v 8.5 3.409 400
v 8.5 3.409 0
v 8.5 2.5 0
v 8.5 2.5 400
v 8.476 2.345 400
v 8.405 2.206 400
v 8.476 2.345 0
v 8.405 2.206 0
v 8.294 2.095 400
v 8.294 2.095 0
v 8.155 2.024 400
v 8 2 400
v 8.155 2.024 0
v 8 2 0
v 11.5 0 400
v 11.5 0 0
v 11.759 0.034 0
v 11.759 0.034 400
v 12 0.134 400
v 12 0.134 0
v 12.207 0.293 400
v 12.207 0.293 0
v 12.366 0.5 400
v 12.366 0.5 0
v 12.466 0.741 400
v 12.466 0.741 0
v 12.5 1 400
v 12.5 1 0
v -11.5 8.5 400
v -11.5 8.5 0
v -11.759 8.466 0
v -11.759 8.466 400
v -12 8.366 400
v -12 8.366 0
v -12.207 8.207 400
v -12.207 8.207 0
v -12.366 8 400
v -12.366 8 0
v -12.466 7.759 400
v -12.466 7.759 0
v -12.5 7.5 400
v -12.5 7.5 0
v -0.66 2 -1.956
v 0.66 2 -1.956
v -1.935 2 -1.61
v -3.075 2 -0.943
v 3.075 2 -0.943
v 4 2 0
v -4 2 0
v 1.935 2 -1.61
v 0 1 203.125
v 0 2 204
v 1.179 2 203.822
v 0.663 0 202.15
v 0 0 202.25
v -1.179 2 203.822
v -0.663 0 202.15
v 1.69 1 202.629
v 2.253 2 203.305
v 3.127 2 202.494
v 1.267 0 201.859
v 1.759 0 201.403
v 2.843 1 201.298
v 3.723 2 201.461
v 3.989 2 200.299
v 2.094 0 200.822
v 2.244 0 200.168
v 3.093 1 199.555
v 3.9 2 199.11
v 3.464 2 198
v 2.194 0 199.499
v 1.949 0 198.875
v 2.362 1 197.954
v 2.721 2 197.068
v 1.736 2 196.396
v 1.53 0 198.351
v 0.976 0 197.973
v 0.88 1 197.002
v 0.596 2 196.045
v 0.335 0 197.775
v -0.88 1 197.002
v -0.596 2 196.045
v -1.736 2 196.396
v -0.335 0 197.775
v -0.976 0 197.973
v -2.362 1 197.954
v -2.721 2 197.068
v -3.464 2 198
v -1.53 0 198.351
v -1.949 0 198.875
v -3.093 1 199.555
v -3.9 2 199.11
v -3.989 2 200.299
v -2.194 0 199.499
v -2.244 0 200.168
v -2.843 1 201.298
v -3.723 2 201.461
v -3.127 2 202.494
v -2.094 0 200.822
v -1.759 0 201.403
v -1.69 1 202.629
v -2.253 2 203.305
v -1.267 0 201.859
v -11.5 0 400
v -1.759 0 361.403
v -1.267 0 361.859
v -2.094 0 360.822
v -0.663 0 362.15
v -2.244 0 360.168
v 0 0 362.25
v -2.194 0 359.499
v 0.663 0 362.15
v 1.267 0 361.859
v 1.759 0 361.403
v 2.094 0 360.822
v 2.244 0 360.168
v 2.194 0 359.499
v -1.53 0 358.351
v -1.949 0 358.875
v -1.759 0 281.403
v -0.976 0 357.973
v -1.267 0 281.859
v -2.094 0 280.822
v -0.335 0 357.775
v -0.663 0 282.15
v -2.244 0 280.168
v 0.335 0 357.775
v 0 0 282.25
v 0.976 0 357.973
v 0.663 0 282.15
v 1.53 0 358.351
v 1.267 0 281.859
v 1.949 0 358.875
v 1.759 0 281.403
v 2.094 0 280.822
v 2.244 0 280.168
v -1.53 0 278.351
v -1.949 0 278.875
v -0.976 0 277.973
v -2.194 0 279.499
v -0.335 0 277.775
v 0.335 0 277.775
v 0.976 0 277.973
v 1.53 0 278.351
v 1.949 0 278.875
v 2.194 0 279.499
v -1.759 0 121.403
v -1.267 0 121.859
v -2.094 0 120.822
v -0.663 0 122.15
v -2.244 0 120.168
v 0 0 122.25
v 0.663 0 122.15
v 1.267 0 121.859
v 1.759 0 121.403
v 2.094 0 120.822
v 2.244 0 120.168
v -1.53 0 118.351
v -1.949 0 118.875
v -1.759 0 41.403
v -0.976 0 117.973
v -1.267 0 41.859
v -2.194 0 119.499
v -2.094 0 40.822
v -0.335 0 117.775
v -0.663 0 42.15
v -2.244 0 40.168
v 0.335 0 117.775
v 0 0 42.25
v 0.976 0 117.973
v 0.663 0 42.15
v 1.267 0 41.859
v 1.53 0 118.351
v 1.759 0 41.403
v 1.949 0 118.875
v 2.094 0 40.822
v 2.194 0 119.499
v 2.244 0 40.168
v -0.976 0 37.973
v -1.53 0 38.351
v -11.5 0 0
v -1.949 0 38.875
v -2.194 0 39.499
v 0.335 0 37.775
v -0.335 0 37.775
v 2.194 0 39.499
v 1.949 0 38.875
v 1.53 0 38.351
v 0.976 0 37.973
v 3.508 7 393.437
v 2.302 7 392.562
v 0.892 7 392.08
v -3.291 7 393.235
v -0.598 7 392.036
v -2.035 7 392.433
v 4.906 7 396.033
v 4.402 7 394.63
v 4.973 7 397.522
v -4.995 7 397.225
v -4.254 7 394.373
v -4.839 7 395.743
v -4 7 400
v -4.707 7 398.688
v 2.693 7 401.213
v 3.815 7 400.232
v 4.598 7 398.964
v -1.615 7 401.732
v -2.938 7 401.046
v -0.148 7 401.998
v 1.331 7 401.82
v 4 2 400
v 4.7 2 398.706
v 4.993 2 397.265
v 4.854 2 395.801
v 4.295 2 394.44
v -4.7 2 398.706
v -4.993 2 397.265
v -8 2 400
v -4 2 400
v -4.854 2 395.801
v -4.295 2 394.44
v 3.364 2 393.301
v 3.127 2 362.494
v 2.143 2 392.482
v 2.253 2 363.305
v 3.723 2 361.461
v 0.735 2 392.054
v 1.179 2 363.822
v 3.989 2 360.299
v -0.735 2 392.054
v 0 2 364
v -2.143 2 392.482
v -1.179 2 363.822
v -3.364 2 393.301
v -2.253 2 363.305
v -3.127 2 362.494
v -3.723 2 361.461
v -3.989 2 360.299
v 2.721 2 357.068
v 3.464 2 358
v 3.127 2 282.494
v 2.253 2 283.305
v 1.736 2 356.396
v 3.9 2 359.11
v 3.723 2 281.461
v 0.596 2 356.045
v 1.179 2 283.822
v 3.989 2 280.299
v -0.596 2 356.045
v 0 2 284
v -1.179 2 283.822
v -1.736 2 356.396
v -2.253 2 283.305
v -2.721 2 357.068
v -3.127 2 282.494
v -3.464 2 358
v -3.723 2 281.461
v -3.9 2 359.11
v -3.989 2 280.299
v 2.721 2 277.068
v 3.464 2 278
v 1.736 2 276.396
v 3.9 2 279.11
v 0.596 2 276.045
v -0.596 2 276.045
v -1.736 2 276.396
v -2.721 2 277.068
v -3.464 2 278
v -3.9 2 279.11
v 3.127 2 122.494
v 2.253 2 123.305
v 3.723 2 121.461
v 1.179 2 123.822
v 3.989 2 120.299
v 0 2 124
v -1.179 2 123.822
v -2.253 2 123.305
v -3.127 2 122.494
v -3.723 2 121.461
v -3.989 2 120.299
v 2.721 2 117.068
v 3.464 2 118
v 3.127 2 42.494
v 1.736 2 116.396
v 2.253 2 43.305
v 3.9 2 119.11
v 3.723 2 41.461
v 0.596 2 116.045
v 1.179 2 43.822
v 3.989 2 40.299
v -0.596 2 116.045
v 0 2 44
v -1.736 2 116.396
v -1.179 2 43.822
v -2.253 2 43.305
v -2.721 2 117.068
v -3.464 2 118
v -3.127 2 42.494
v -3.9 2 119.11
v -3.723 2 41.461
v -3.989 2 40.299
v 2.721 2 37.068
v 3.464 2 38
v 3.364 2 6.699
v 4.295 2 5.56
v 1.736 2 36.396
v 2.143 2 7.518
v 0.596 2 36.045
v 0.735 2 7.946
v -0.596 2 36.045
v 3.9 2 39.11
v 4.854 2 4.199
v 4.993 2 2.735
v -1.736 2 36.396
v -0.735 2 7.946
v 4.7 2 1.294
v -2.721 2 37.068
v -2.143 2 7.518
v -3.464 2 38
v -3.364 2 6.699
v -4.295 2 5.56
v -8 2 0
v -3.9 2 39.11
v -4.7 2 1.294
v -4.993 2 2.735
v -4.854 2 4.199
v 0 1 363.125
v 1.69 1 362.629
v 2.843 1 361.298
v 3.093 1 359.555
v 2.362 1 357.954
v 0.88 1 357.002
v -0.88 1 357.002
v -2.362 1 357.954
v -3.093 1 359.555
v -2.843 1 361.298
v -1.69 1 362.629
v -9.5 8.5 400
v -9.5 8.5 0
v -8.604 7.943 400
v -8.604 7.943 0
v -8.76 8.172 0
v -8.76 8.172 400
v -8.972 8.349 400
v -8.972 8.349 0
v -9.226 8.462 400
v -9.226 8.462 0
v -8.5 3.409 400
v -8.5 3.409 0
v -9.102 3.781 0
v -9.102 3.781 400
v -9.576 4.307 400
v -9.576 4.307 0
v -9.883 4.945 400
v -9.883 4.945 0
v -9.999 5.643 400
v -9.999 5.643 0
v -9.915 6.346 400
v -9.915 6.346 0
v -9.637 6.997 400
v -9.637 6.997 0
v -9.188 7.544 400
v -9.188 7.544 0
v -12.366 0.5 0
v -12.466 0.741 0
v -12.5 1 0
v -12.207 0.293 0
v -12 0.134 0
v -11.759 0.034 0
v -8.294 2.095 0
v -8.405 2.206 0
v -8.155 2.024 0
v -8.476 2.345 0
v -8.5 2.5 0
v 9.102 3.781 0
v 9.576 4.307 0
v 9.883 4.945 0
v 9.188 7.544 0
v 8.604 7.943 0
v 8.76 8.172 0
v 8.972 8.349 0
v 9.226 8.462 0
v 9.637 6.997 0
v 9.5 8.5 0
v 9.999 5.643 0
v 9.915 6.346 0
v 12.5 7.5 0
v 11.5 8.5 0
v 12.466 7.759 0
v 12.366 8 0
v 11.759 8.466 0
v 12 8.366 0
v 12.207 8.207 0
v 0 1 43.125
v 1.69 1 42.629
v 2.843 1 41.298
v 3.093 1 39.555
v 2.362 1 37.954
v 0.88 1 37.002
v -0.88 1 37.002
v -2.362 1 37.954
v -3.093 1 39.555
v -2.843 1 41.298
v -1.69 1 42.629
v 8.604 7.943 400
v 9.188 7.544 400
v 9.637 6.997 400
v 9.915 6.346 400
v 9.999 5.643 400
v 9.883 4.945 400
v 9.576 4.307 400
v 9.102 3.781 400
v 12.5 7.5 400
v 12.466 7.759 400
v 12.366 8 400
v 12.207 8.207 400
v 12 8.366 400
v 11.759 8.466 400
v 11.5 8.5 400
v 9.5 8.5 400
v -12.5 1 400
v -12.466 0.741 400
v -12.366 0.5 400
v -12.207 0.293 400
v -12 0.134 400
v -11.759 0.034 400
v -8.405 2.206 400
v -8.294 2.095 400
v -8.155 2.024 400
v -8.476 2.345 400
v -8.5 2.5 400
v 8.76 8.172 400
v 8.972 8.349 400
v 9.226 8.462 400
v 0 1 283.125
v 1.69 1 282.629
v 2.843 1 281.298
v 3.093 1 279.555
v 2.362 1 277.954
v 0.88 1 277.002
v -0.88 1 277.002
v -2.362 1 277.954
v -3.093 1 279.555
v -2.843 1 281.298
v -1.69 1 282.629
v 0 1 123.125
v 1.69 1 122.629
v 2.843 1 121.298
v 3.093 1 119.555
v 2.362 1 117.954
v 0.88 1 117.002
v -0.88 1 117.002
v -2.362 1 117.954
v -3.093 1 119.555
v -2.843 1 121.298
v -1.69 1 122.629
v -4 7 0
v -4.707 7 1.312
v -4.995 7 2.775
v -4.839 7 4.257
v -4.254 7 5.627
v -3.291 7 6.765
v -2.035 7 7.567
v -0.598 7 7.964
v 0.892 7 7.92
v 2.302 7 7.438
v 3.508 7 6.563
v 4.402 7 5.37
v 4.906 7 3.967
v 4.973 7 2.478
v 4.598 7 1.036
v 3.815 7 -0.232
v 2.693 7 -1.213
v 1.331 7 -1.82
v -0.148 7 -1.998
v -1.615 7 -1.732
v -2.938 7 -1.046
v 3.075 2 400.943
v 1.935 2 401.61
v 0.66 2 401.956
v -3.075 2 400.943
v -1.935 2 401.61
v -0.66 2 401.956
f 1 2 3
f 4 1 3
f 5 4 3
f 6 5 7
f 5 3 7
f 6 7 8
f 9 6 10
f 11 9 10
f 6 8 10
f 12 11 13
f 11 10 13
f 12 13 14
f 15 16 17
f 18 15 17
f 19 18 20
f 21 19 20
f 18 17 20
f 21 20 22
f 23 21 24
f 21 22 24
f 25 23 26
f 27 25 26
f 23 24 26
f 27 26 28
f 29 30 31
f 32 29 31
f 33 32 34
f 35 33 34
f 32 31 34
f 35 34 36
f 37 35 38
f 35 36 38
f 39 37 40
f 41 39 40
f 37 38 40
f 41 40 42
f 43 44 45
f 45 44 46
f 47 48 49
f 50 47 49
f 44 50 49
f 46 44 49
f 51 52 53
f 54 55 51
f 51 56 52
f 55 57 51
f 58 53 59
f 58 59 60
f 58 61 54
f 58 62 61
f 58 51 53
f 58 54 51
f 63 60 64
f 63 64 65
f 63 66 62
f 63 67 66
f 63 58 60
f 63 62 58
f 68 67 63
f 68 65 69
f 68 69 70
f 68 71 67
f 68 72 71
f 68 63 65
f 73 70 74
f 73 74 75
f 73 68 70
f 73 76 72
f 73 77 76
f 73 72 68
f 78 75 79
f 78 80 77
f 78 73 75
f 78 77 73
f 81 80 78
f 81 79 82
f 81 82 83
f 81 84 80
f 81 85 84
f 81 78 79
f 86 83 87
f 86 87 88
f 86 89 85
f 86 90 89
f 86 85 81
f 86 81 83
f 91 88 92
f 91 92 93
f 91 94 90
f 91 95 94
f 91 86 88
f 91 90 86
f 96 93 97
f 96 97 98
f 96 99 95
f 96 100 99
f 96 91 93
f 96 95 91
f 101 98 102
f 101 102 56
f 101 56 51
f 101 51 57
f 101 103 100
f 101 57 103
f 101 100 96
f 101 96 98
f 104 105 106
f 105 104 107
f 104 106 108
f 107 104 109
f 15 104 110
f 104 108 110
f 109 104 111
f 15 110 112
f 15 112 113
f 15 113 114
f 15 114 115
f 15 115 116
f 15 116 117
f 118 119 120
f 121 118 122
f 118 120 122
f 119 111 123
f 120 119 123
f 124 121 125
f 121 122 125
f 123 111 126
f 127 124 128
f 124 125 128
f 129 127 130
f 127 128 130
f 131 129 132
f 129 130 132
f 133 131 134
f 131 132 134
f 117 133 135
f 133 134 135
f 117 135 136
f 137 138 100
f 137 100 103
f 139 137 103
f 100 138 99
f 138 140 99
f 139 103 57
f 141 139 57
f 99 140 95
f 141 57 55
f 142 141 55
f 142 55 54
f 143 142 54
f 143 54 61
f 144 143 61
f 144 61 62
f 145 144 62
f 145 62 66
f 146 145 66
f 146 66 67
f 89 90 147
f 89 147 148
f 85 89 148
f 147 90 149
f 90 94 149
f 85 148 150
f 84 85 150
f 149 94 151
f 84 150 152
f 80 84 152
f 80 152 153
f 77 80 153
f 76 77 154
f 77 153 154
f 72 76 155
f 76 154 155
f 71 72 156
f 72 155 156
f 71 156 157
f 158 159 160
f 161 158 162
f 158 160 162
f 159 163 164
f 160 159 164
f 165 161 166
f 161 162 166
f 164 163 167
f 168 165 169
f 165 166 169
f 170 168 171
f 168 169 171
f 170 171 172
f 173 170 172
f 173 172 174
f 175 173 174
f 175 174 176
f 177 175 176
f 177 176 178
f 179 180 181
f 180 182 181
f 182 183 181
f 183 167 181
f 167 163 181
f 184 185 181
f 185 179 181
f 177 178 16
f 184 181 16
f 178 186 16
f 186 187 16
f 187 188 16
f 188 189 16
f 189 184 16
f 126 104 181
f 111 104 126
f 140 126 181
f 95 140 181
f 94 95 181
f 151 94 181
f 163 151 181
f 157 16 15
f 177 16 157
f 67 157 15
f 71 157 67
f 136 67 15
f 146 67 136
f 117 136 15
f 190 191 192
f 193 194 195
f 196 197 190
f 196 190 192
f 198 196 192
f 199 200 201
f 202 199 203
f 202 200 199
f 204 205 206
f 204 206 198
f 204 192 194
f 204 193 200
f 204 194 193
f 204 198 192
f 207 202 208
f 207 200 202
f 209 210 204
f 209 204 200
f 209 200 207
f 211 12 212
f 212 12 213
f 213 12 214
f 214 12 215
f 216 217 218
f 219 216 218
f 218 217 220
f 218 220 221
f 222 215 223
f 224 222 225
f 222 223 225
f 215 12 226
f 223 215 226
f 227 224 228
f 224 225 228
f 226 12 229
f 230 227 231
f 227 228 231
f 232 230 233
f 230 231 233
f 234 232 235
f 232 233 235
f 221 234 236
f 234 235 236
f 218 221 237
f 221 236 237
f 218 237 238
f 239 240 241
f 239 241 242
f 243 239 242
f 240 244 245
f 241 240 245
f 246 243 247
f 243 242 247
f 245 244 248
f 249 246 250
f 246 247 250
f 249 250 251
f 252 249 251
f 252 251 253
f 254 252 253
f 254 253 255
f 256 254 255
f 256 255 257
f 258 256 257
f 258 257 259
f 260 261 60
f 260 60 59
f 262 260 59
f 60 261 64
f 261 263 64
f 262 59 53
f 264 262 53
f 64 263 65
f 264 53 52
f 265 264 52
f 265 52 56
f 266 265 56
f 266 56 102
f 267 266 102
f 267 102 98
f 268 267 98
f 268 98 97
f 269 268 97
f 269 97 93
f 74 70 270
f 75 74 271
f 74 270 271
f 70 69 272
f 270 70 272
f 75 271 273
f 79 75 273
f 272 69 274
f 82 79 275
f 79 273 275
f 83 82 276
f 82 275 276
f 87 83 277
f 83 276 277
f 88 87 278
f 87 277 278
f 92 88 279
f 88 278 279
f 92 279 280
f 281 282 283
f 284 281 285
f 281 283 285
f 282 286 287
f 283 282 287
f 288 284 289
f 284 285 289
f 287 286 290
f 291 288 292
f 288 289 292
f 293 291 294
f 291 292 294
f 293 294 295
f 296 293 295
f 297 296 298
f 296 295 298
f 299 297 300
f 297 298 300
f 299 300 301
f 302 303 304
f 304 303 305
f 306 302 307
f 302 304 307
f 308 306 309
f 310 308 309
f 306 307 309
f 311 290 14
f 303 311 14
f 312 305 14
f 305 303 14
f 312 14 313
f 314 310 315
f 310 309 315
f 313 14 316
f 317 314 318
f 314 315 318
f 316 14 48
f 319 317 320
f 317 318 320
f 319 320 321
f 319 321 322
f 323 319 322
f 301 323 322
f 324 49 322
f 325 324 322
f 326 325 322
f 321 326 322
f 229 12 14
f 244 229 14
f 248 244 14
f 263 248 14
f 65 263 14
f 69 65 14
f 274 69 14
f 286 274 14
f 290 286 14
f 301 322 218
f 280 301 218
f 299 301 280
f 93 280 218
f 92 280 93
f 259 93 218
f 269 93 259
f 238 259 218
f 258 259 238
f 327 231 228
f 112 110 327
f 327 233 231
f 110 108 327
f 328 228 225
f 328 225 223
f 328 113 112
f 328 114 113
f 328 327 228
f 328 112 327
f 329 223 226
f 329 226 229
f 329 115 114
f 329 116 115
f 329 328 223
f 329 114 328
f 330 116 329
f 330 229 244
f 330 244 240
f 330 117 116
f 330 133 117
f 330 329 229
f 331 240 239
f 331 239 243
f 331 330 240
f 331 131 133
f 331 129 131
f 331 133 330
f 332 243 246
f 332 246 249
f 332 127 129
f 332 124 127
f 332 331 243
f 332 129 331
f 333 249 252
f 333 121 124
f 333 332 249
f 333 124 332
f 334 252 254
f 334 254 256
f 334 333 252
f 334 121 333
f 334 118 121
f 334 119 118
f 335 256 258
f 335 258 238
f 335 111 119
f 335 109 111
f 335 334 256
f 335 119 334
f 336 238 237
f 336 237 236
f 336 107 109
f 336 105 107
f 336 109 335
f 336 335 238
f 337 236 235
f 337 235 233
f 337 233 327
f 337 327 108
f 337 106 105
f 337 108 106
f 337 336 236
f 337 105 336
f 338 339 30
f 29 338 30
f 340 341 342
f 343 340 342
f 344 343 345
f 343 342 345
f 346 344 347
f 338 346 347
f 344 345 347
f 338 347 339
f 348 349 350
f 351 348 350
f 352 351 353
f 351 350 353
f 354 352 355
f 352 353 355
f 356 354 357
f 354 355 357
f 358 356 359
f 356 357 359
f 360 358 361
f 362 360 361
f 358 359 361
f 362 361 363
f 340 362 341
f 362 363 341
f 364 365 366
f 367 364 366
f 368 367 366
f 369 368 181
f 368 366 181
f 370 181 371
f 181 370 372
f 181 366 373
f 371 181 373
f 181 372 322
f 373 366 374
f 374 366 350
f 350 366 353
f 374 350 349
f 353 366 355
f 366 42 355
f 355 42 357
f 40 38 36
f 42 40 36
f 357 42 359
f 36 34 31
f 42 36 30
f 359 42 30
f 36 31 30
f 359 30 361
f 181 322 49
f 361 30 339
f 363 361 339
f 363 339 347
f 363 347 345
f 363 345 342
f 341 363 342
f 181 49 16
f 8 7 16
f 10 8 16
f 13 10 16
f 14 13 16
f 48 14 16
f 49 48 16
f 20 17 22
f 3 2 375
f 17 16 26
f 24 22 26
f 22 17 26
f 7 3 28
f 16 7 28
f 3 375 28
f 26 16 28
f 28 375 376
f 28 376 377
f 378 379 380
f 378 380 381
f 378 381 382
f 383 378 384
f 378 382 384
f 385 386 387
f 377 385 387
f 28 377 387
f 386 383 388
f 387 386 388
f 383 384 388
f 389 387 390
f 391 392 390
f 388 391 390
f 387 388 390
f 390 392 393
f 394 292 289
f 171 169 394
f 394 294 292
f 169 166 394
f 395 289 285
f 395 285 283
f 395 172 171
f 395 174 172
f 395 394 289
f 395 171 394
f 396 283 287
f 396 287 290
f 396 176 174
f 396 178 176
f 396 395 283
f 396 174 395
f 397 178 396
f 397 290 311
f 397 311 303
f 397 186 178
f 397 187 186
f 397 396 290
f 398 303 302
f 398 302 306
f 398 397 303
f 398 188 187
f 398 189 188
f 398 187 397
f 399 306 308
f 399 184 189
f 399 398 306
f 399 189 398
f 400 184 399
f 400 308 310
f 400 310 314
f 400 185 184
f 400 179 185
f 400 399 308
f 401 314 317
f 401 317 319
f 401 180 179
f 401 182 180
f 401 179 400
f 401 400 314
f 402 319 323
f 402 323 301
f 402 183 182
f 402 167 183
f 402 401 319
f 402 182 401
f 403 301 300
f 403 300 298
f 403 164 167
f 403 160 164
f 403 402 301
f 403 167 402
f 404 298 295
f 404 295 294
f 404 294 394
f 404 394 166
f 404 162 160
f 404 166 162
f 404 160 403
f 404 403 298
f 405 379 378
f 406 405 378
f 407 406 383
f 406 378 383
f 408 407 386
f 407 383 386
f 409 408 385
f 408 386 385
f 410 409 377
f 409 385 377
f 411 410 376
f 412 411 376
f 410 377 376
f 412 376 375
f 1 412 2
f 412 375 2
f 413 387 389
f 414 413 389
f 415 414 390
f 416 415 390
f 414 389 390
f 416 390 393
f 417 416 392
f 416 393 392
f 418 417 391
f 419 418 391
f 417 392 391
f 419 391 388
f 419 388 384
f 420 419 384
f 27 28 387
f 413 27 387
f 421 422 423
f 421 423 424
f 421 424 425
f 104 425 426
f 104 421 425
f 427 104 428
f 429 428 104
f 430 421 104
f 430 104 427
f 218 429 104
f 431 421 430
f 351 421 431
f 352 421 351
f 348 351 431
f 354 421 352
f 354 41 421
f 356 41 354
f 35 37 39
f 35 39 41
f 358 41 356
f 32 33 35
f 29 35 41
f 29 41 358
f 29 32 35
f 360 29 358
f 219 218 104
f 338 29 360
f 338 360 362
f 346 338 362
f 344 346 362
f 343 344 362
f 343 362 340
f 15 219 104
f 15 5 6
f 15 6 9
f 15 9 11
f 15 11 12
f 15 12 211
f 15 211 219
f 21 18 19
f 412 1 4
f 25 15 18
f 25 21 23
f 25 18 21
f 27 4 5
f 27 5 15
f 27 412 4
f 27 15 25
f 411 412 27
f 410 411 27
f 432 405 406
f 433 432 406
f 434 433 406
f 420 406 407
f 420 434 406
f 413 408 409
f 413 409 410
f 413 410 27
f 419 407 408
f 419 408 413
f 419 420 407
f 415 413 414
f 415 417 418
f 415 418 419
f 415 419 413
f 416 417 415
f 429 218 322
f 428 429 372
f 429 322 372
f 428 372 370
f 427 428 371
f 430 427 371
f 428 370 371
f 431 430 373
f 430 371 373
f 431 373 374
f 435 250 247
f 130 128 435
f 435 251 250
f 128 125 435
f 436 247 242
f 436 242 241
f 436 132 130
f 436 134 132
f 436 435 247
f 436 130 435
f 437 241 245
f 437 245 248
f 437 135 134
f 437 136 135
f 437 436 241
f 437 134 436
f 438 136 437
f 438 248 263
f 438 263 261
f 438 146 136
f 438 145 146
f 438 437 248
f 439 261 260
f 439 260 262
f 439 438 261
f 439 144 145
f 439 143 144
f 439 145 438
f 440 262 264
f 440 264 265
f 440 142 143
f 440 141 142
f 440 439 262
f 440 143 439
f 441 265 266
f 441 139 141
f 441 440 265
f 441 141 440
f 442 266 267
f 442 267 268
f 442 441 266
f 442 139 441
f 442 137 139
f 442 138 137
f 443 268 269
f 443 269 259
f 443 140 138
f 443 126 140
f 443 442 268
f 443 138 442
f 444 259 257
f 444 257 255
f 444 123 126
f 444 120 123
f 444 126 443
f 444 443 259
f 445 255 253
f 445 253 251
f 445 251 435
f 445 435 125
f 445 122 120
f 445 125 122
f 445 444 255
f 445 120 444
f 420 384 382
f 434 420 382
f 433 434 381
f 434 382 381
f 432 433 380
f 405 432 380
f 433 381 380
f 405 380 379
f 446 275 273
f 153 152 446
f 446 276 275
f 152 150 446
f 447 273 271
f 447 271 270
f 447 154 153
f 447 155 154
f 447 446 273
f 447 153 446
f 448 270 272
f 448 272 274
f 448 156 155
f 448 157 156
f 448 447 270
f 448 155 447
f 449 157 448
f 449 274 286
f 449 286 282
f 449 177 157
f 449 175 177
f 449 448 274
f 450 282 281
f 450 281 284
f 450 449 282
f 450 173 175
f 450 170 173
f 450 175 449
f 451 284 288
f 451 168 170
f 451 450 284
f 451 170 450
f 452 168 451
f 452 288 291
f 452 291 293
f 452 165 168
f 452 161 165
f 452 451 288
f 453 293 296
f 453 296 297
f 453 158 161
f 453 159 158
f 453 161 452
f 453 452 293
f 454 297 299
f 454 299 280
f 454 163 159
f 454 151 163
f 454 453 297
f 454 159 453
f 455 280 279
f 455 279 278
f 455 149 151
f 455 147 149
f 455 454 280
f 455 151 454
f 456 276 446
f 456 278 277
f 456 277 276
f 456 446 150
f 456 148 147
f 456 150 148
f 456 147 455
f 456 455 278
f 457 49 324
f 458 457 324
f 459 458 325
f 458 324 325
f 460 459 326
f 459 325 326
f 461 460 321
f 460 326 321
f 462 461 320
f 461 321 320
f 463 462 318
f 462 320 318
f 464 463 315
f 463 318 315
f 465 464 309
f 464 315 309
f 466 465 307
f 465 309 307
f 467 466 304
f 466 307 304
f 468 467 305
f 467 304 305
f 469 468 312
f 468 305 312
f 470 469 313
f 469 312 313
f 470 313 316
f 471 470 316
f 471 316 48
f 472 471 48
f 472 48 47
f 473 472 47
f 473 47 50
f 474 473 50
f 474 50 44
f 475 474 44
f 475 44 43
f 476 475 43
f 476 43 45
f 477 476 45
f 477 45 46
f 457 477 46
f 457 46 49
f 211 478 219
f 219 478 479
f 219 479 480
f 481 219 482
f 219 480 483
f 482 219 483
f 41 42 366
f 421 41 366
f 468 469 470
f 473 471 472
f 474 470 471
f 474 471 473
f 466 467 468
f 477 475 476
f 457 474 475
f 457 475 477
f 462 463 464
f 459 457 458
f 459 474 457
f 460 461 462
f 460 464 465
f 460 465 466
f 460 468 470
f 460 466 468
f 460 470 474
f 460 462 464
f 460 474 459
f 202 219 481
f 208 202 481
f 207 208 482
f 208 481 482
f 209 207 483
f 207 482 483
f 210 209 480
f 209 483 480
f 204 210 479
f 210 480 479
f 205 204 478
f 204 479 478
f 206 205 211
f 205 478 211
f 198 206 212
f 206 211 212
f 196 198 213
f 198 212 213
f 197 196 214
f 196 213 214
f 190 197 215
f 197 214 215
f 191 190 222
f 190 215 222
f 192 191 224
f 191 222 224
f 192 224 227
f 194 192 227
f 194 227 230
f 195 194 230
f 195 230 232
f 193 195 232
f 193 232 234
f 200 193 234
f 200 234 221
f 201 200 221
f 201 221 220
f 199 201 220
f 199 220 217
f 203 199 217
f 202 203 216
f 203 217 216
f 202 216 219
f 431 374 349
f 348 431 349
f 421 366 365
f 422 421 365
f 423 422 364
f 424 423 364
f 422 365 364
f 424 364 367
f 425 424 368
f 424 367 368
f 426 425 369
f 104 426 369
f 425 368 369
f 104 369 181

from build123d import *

# Parameters (mm, degrees)
BOSS_EXTRUDE1_DEPTH = 400
SKETCH7_R           = 5
BOSS_EXTRUDE2_DEPTH = 5
SKETCH8_R           = 5
BOSS_EXTRUDE3_DEPTH = 5


with BuildPart() as part:
    # Sketch1 → Boss-Extrude1 (new body)
    with BuildSketch(Plane.XY):
        with BuildLine():
            Line((-11.5, 0), (11.5, 0))
            ThreePointArc((11.5, 0), (12.207106781, 0.292893219), (12.5, 1))
            Line((12.5, 1), (12.5, 7.5))
            ThreePointArc((12.5, 7.5), (12.207106781, 8.207106781), (11.5, 8.5))
            Line((11.5, 8.5), (9.5, 8.5))
            ThreePointArc((9.5, 8.5), (8.97237829, 8.349479447), (8.603592403, 7.943230663))
            ThreePointArc((8.603592403, 7.943230663), (9.999347871, 5.642901666), (8.5, 3.408712153))
            Line((8.5, 3.408712153), (8.5, 2.5))
            ThreePointArc((8.5, 2.5), (8.353553391, 2.146446609), (8, 2))
            Line((8, 2), (-8, 2))
            ThreePointArc((-8, 2), (-8.353553391, 2.146446609), (-8.5, 2.5))
            Line((-8.5, 2.5), (-8.5, 3.408712153))
            ThreePointArc((-8.5, 3.408712153), (-9.999347871, 5.642901666), (-8.603592403, 7.943230663))
            ThreePointArc((-8.603592403, 7.943230663), (-8.97237829, 8.349479447), (-9.5, 8.5))
            Line((-9.5, 8.5), (-11.5, 8.5))
            ThreePointArc((-11.5, 8.5), (-12.207106781, 8.207106781), (-12.5, 7.5))
            Line((-12.5, 7.5), (-12.5, 1))
            ThreePointArc((-12.5, 1), (-12.207106781, 0.292893219), (-11.5, 0))
        make_face()
    extrude(amount=BOSS_EXTRUDE1_DEPTH)

    # Sketch2 → Cut-Revolve1 (revolve, cut)
    with BuildSketch(Plane.XY.offset(40), mode=Mode.PRIVATE) as cut_revolve1_sk:
        Polygon((0, 2), (4, 2), (2.25, 0), (0, 0), align=None)
    revolve(cut_revolve1_sk.sketch.rotate(Axis((0, 0, 40), (0, 1, 0)), 270), axis=Axis((0, 0, 40), (0, 1, 0)), mode=Mode.SUBTRACT)

    # Sketch3 → Cut-Revolve2 (revolve, cut)
    with BuildSketch(Plane.XY.offset(120), mode=Mode.PRIVATE) as cut_revolve2_sk:
        Polygon((0, 2), (4, 2), (2.25, 0), (0, 0), align=None)
    revolve(cut_revolve2_sk.sketch.rotate(Axis((0, 0, 120), (0, 1, 0)), 270), axis=Axis((0, 0, 120), (0, 1, 0)), mode=Mode.SUBTRACT)

    # Sketch4 → Cut-Revolve3 (revolve, cut)
    with BuildSketch(Plane.XY.offset(200), mode=Mode.PRIVATE) as cut_revolve3_sk:
        Polygon((0, 2), (4, 2), (2.25, 0), (0, 0), align=None)
    revolve(cut_revolve3_sk.sketch.rotate(Axis((0, 0, 200), (0, 1, 0)), 270), axis=Axis((0, 0, 200), (0, 1, 0)), mode=Mode.SUBTRACT)

    # Sketch5 → Cut-Revolve4 (revolve, cut)
    with BuildSketch(Plane.XY.offset(280), mode=Mode.PRIVATE) as cut_revolve4_sk:
        Polygon((0, 2), (4, 2), (2.25, 0), (0, 0), align=None)
    revolve(cut_revolve4_sk.sketch.rotate(Axis((0, 0, 280), (0, 1, 0)), 270), axis=Axis((0, 0, 280), (0, 1, 0)), mode=Mode.SUBTRACT)

    # Sketch6 → Cut-Revolve5 (revolve, cut)
    with BuildSketch(Plane.XY.offset(360), mode=Mode.PRIVATE) as cut_revolve5_sk:
        Polygon((0, 2), (4, 2), (2.25, 0), (0, 0), align=None)
    revolve(cut_revolve5_sk.sketch.rotate(Axis((0, 0, 360), (0, 1, 0)), 270), axis=Axis((0, 0, 360), (0, 1, 0)), mode=Mode.SUBTRACT)

    # Sketch7 → Boss-Extrude2 (add)
    with BuildSketch(Plane(origin=(0, 2, 0), x_dir=(1, 0, 0), z_dir=(0, 1, 0))):
        with Locations(Location((0, -3, 0), (0, 0, 143.130102354))):
            Circle(SKETCH7_R)
    extrude(amount=BOSS_EXTRUDE2_DEPTH)

    # Sketch8 → Boss-Extrude3 (add)
    with BuildSketch(Plane(origin=(0, 2, 0), x_dir=(1, 0, 0), z_dir=(0, 1, 0))):
        with Locations(Location((0, -397, 0), (0, 0, 216.869897646))):
            Circle(SKETCH8_R)
    extrude(amount=BOSS_EXTRUDE3_DEPTH)


solid = part.part
